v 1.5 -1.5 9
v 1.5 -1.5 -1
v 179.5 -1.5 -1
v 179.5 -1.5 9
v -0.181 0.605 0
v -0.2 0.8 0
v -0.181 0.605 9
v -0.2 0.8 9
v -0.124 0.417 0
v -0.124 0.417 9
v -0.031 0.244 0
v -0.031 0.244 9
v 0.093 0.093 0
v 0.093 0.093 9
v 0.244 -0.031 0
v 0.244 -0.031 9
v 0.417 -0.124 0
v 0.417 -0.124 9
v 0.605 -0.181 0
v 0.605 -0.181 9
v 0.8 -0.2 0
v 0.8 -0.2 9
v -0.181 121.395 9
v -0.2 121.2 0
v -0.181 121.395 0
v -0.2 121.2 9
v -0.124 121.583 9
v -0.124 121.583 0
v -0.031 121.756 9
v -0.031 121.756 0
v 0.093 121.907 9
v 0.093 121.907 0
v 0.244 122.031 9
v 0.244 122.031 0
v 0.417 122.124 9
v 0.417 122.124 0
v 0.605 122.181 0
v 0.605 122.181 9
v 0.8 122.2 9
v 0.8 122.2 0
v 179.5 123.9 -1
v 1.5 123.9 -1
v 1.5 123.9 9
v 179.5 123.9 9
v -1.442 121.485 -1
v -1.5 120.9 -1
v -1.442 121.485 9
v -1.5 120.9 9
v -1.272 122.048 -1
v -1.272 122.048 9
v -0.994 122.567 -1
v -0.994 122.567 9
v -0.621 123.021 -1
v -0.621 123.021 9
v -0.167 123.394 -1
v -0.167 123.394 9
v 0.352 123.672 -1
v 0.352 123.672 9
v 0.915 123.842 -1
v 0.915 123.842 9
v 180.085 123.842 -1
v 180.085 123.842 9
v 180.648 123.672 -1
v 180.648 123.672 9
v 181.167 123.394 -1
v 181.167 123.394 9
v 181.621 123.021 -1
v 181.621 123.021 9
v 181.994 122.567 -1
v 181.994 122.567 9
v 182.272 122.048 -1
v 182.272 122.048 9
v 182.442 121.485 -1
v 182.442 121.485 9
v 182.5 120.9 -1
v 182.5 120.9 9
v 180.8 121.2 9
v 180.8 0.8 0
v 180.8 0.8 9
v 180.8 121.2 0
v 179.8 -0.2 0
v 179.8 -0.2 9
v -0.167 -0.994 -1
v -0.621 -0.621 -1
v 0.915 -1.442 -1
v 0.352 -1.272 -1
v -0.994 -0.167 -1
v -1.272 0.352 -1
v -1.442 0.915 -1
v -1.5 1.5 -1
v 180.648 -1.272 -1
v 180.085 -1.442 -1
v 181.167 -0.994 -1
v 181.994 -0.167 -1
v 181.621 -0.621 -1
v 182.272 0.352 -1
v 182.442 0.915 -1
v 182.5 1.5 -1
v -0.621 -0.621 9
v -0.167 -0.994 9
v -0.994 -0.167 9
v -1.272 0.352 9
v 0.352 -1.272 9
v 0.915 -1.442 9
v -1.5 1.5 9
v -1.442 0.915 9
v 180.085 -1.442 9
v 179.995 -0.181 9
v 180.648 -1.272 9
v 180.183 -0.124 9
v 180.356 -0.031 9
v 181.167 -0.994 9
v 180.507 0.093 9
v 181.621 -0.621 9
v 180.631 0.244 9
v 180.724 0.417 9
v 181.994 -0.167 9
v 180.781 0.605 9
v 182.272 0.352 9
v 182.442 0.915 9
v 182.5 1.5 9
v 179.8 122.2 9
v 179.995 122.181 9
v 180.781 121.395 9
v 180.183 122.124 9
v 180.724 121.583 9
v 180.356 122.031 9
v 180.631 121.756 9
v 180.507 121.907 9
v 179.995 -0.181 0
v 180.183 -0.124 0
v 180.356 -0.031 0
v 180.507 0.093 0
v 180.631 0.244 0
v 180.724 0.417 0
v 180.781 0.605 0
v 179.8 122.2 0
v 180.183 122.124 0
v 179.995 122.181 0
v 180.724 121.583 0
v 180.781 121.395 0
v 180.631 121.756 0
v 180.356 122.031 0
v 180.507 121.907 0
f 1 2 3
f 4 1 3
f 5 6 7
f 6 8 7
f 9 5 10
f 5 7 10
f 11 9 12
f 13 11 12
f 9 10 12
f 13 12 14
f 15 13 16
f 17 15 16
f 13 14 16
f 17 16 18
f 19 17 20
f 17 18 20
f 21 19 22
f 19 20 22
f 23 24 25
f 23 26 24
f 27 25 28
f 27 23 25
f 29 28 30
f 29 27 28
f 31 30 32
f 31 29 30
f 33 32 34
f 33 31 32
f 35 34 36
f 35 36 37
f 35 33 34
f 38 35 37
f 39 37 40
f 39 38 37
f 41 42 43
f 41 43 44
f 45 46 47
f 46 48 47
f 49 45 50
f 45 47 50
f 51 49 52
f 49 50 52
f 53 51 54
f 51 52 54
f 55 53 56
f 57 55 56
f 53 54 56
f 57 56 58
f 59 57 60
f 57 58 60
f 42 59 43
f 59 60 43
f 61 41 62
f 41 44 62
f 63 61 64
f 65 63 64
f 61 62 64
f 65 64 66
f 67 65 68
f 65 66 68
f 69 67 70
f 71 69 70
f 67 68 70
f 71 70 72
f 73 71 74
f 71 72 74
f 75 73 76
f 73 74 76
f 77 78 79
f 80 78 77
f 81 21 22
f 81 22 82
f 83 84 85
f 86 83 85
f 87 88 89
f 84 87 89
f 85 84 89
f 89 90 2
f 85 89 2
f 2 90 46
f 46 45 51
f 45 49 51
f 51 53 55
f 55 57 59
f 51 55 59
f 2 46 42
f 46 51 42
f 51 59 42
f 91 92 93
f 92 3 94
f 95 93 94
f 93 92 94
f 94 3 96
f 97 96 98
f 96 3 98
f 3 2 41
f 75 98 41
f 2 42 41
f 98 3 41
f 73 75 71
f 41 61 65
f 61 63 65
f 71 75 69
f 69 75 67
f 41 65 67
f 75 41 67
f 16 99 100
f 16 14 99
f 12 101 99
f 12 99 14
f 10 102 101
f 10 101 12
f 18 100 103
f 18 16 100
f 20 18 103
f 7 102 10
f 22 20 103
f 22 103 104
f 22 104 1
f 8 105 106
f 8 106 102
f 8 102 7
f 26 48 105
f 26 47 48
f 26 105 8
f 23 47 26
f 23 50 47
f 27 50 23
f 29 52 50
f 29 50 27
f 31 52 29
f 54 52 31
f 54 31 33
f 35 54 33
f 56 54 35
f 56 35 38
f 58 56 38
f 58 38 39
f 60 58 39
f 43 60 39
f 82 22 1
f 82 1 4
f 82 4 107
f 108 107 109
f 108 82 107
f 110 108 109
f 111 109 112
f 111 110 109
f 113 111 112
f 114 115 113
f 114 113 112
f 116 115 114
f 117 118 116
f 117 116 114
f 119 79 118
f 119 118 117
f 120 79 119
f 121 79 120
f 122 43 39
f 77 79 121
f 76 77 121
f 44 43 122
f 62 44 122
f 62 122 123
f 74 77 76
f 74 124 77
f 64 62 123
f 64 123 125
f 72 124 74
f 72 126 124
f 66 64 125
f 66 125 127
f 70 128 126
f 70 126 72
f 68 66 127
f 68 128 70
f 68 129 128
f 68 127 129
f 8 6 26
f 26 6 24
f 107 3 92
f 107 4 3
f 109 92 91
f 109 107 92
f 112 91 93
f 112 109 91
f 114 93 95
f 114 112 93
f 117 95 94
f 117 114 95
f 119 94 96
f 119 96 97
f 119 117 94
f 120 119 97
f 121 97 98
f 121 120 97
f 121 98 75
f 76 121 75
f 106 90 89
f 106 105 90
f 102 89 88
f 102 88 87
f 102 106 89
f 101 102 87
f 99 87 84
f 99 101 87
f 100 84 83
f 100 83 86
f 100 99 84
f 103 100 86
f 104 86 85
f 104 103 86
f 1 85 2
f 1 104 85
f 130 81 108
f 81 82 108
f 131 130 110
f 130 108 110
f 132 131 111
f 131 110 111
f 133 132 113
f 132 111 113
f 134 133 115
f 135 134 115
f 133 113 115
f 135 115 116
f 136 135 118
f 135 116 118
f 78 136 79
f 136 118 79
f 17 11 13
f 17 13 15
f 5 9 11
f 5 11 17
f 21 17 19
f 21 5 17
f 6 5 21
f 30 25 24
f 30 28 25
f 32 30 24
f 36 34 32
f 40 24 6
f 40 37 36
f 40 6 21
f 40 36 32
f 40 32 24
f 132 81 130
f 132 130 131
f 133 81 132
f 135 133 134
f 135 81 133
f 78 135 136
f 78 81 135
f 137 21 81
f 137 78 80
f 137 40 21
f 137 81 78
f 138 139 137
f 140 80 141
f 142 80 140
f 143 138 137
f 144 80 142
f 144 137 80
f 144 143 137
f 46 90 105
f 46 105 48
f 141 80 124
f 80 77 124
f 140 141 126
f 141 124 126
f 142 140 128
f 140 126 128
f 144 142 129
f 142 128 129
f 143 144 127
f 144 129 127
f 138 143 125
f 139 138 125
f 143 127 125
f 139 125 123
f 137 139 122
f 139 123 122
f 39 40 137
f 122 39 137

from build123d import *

# Parameters (mm, degrees)
BOX044_W      = 181
BOX044_H      = 122.4
BOX044_DEPTH  = 10
BOX045_W      = 184
BOX045_H      = 125.4
BOX045_DEPTH  = 10
FILLET005_1_R = 3
FILLET005_2_R = 1


with BuildPart() as cube022:
    # Box044 → Box044 (new body)
    with BuildSketch(Plane(origin=(-0.2, -0.2, 0), x_dir=(1, 0, 0), z_dir=(0, 0, 1))):
        with Locations((90.5, 61.2)):
            Rectangle(BOX044_W, BOX044_H)
    extrude(amount=BOX044_DEPTH)


with BuildPart() as fillet005:
    # Box045 → Box045 (new body)
    with BuildSketch(Plane(origin=(-1.5, -1.5, -1), x_dir=(1, 0, 0), z_dir=(0, 0, 1))):
        with Locations((92, 62.7)):
            Rectangle(BOX045_W, BOX045_H)
    extrude(amount=BOX045_DEPTH)

    # Cut007: cut Cube022
    add(cube022.part, mode=Mode.SUBTRACT)

    # Fillet005 1
    fillet005_1_edges = [fillet005.edges().sort_by_distance(p)[0] for p in [
        (-1.5, -1.5, 4),
        (-1.5, 123.9, 4),
        (182.5, -1.5, 4),
        (182.5, 123.9, 4),
    ]]
    fillet(fillet005_1_edges, radius=FILLET005_1_R)

    # Fillet005 2
    fillet005_2_edges = [fillet005.edges().sort_by_distance(p)[0] for p in [
        (180.8, -0.2, 4.5),
        (-0.2, -0.2, 4.5),
        (180.8, 122.2, 4.5),
        (-0.2, 122.2, 4.5),
    ]]
    fillet(fillet005_2_edges, radius=FILLET005_2_R)


solid = fillet005.part
